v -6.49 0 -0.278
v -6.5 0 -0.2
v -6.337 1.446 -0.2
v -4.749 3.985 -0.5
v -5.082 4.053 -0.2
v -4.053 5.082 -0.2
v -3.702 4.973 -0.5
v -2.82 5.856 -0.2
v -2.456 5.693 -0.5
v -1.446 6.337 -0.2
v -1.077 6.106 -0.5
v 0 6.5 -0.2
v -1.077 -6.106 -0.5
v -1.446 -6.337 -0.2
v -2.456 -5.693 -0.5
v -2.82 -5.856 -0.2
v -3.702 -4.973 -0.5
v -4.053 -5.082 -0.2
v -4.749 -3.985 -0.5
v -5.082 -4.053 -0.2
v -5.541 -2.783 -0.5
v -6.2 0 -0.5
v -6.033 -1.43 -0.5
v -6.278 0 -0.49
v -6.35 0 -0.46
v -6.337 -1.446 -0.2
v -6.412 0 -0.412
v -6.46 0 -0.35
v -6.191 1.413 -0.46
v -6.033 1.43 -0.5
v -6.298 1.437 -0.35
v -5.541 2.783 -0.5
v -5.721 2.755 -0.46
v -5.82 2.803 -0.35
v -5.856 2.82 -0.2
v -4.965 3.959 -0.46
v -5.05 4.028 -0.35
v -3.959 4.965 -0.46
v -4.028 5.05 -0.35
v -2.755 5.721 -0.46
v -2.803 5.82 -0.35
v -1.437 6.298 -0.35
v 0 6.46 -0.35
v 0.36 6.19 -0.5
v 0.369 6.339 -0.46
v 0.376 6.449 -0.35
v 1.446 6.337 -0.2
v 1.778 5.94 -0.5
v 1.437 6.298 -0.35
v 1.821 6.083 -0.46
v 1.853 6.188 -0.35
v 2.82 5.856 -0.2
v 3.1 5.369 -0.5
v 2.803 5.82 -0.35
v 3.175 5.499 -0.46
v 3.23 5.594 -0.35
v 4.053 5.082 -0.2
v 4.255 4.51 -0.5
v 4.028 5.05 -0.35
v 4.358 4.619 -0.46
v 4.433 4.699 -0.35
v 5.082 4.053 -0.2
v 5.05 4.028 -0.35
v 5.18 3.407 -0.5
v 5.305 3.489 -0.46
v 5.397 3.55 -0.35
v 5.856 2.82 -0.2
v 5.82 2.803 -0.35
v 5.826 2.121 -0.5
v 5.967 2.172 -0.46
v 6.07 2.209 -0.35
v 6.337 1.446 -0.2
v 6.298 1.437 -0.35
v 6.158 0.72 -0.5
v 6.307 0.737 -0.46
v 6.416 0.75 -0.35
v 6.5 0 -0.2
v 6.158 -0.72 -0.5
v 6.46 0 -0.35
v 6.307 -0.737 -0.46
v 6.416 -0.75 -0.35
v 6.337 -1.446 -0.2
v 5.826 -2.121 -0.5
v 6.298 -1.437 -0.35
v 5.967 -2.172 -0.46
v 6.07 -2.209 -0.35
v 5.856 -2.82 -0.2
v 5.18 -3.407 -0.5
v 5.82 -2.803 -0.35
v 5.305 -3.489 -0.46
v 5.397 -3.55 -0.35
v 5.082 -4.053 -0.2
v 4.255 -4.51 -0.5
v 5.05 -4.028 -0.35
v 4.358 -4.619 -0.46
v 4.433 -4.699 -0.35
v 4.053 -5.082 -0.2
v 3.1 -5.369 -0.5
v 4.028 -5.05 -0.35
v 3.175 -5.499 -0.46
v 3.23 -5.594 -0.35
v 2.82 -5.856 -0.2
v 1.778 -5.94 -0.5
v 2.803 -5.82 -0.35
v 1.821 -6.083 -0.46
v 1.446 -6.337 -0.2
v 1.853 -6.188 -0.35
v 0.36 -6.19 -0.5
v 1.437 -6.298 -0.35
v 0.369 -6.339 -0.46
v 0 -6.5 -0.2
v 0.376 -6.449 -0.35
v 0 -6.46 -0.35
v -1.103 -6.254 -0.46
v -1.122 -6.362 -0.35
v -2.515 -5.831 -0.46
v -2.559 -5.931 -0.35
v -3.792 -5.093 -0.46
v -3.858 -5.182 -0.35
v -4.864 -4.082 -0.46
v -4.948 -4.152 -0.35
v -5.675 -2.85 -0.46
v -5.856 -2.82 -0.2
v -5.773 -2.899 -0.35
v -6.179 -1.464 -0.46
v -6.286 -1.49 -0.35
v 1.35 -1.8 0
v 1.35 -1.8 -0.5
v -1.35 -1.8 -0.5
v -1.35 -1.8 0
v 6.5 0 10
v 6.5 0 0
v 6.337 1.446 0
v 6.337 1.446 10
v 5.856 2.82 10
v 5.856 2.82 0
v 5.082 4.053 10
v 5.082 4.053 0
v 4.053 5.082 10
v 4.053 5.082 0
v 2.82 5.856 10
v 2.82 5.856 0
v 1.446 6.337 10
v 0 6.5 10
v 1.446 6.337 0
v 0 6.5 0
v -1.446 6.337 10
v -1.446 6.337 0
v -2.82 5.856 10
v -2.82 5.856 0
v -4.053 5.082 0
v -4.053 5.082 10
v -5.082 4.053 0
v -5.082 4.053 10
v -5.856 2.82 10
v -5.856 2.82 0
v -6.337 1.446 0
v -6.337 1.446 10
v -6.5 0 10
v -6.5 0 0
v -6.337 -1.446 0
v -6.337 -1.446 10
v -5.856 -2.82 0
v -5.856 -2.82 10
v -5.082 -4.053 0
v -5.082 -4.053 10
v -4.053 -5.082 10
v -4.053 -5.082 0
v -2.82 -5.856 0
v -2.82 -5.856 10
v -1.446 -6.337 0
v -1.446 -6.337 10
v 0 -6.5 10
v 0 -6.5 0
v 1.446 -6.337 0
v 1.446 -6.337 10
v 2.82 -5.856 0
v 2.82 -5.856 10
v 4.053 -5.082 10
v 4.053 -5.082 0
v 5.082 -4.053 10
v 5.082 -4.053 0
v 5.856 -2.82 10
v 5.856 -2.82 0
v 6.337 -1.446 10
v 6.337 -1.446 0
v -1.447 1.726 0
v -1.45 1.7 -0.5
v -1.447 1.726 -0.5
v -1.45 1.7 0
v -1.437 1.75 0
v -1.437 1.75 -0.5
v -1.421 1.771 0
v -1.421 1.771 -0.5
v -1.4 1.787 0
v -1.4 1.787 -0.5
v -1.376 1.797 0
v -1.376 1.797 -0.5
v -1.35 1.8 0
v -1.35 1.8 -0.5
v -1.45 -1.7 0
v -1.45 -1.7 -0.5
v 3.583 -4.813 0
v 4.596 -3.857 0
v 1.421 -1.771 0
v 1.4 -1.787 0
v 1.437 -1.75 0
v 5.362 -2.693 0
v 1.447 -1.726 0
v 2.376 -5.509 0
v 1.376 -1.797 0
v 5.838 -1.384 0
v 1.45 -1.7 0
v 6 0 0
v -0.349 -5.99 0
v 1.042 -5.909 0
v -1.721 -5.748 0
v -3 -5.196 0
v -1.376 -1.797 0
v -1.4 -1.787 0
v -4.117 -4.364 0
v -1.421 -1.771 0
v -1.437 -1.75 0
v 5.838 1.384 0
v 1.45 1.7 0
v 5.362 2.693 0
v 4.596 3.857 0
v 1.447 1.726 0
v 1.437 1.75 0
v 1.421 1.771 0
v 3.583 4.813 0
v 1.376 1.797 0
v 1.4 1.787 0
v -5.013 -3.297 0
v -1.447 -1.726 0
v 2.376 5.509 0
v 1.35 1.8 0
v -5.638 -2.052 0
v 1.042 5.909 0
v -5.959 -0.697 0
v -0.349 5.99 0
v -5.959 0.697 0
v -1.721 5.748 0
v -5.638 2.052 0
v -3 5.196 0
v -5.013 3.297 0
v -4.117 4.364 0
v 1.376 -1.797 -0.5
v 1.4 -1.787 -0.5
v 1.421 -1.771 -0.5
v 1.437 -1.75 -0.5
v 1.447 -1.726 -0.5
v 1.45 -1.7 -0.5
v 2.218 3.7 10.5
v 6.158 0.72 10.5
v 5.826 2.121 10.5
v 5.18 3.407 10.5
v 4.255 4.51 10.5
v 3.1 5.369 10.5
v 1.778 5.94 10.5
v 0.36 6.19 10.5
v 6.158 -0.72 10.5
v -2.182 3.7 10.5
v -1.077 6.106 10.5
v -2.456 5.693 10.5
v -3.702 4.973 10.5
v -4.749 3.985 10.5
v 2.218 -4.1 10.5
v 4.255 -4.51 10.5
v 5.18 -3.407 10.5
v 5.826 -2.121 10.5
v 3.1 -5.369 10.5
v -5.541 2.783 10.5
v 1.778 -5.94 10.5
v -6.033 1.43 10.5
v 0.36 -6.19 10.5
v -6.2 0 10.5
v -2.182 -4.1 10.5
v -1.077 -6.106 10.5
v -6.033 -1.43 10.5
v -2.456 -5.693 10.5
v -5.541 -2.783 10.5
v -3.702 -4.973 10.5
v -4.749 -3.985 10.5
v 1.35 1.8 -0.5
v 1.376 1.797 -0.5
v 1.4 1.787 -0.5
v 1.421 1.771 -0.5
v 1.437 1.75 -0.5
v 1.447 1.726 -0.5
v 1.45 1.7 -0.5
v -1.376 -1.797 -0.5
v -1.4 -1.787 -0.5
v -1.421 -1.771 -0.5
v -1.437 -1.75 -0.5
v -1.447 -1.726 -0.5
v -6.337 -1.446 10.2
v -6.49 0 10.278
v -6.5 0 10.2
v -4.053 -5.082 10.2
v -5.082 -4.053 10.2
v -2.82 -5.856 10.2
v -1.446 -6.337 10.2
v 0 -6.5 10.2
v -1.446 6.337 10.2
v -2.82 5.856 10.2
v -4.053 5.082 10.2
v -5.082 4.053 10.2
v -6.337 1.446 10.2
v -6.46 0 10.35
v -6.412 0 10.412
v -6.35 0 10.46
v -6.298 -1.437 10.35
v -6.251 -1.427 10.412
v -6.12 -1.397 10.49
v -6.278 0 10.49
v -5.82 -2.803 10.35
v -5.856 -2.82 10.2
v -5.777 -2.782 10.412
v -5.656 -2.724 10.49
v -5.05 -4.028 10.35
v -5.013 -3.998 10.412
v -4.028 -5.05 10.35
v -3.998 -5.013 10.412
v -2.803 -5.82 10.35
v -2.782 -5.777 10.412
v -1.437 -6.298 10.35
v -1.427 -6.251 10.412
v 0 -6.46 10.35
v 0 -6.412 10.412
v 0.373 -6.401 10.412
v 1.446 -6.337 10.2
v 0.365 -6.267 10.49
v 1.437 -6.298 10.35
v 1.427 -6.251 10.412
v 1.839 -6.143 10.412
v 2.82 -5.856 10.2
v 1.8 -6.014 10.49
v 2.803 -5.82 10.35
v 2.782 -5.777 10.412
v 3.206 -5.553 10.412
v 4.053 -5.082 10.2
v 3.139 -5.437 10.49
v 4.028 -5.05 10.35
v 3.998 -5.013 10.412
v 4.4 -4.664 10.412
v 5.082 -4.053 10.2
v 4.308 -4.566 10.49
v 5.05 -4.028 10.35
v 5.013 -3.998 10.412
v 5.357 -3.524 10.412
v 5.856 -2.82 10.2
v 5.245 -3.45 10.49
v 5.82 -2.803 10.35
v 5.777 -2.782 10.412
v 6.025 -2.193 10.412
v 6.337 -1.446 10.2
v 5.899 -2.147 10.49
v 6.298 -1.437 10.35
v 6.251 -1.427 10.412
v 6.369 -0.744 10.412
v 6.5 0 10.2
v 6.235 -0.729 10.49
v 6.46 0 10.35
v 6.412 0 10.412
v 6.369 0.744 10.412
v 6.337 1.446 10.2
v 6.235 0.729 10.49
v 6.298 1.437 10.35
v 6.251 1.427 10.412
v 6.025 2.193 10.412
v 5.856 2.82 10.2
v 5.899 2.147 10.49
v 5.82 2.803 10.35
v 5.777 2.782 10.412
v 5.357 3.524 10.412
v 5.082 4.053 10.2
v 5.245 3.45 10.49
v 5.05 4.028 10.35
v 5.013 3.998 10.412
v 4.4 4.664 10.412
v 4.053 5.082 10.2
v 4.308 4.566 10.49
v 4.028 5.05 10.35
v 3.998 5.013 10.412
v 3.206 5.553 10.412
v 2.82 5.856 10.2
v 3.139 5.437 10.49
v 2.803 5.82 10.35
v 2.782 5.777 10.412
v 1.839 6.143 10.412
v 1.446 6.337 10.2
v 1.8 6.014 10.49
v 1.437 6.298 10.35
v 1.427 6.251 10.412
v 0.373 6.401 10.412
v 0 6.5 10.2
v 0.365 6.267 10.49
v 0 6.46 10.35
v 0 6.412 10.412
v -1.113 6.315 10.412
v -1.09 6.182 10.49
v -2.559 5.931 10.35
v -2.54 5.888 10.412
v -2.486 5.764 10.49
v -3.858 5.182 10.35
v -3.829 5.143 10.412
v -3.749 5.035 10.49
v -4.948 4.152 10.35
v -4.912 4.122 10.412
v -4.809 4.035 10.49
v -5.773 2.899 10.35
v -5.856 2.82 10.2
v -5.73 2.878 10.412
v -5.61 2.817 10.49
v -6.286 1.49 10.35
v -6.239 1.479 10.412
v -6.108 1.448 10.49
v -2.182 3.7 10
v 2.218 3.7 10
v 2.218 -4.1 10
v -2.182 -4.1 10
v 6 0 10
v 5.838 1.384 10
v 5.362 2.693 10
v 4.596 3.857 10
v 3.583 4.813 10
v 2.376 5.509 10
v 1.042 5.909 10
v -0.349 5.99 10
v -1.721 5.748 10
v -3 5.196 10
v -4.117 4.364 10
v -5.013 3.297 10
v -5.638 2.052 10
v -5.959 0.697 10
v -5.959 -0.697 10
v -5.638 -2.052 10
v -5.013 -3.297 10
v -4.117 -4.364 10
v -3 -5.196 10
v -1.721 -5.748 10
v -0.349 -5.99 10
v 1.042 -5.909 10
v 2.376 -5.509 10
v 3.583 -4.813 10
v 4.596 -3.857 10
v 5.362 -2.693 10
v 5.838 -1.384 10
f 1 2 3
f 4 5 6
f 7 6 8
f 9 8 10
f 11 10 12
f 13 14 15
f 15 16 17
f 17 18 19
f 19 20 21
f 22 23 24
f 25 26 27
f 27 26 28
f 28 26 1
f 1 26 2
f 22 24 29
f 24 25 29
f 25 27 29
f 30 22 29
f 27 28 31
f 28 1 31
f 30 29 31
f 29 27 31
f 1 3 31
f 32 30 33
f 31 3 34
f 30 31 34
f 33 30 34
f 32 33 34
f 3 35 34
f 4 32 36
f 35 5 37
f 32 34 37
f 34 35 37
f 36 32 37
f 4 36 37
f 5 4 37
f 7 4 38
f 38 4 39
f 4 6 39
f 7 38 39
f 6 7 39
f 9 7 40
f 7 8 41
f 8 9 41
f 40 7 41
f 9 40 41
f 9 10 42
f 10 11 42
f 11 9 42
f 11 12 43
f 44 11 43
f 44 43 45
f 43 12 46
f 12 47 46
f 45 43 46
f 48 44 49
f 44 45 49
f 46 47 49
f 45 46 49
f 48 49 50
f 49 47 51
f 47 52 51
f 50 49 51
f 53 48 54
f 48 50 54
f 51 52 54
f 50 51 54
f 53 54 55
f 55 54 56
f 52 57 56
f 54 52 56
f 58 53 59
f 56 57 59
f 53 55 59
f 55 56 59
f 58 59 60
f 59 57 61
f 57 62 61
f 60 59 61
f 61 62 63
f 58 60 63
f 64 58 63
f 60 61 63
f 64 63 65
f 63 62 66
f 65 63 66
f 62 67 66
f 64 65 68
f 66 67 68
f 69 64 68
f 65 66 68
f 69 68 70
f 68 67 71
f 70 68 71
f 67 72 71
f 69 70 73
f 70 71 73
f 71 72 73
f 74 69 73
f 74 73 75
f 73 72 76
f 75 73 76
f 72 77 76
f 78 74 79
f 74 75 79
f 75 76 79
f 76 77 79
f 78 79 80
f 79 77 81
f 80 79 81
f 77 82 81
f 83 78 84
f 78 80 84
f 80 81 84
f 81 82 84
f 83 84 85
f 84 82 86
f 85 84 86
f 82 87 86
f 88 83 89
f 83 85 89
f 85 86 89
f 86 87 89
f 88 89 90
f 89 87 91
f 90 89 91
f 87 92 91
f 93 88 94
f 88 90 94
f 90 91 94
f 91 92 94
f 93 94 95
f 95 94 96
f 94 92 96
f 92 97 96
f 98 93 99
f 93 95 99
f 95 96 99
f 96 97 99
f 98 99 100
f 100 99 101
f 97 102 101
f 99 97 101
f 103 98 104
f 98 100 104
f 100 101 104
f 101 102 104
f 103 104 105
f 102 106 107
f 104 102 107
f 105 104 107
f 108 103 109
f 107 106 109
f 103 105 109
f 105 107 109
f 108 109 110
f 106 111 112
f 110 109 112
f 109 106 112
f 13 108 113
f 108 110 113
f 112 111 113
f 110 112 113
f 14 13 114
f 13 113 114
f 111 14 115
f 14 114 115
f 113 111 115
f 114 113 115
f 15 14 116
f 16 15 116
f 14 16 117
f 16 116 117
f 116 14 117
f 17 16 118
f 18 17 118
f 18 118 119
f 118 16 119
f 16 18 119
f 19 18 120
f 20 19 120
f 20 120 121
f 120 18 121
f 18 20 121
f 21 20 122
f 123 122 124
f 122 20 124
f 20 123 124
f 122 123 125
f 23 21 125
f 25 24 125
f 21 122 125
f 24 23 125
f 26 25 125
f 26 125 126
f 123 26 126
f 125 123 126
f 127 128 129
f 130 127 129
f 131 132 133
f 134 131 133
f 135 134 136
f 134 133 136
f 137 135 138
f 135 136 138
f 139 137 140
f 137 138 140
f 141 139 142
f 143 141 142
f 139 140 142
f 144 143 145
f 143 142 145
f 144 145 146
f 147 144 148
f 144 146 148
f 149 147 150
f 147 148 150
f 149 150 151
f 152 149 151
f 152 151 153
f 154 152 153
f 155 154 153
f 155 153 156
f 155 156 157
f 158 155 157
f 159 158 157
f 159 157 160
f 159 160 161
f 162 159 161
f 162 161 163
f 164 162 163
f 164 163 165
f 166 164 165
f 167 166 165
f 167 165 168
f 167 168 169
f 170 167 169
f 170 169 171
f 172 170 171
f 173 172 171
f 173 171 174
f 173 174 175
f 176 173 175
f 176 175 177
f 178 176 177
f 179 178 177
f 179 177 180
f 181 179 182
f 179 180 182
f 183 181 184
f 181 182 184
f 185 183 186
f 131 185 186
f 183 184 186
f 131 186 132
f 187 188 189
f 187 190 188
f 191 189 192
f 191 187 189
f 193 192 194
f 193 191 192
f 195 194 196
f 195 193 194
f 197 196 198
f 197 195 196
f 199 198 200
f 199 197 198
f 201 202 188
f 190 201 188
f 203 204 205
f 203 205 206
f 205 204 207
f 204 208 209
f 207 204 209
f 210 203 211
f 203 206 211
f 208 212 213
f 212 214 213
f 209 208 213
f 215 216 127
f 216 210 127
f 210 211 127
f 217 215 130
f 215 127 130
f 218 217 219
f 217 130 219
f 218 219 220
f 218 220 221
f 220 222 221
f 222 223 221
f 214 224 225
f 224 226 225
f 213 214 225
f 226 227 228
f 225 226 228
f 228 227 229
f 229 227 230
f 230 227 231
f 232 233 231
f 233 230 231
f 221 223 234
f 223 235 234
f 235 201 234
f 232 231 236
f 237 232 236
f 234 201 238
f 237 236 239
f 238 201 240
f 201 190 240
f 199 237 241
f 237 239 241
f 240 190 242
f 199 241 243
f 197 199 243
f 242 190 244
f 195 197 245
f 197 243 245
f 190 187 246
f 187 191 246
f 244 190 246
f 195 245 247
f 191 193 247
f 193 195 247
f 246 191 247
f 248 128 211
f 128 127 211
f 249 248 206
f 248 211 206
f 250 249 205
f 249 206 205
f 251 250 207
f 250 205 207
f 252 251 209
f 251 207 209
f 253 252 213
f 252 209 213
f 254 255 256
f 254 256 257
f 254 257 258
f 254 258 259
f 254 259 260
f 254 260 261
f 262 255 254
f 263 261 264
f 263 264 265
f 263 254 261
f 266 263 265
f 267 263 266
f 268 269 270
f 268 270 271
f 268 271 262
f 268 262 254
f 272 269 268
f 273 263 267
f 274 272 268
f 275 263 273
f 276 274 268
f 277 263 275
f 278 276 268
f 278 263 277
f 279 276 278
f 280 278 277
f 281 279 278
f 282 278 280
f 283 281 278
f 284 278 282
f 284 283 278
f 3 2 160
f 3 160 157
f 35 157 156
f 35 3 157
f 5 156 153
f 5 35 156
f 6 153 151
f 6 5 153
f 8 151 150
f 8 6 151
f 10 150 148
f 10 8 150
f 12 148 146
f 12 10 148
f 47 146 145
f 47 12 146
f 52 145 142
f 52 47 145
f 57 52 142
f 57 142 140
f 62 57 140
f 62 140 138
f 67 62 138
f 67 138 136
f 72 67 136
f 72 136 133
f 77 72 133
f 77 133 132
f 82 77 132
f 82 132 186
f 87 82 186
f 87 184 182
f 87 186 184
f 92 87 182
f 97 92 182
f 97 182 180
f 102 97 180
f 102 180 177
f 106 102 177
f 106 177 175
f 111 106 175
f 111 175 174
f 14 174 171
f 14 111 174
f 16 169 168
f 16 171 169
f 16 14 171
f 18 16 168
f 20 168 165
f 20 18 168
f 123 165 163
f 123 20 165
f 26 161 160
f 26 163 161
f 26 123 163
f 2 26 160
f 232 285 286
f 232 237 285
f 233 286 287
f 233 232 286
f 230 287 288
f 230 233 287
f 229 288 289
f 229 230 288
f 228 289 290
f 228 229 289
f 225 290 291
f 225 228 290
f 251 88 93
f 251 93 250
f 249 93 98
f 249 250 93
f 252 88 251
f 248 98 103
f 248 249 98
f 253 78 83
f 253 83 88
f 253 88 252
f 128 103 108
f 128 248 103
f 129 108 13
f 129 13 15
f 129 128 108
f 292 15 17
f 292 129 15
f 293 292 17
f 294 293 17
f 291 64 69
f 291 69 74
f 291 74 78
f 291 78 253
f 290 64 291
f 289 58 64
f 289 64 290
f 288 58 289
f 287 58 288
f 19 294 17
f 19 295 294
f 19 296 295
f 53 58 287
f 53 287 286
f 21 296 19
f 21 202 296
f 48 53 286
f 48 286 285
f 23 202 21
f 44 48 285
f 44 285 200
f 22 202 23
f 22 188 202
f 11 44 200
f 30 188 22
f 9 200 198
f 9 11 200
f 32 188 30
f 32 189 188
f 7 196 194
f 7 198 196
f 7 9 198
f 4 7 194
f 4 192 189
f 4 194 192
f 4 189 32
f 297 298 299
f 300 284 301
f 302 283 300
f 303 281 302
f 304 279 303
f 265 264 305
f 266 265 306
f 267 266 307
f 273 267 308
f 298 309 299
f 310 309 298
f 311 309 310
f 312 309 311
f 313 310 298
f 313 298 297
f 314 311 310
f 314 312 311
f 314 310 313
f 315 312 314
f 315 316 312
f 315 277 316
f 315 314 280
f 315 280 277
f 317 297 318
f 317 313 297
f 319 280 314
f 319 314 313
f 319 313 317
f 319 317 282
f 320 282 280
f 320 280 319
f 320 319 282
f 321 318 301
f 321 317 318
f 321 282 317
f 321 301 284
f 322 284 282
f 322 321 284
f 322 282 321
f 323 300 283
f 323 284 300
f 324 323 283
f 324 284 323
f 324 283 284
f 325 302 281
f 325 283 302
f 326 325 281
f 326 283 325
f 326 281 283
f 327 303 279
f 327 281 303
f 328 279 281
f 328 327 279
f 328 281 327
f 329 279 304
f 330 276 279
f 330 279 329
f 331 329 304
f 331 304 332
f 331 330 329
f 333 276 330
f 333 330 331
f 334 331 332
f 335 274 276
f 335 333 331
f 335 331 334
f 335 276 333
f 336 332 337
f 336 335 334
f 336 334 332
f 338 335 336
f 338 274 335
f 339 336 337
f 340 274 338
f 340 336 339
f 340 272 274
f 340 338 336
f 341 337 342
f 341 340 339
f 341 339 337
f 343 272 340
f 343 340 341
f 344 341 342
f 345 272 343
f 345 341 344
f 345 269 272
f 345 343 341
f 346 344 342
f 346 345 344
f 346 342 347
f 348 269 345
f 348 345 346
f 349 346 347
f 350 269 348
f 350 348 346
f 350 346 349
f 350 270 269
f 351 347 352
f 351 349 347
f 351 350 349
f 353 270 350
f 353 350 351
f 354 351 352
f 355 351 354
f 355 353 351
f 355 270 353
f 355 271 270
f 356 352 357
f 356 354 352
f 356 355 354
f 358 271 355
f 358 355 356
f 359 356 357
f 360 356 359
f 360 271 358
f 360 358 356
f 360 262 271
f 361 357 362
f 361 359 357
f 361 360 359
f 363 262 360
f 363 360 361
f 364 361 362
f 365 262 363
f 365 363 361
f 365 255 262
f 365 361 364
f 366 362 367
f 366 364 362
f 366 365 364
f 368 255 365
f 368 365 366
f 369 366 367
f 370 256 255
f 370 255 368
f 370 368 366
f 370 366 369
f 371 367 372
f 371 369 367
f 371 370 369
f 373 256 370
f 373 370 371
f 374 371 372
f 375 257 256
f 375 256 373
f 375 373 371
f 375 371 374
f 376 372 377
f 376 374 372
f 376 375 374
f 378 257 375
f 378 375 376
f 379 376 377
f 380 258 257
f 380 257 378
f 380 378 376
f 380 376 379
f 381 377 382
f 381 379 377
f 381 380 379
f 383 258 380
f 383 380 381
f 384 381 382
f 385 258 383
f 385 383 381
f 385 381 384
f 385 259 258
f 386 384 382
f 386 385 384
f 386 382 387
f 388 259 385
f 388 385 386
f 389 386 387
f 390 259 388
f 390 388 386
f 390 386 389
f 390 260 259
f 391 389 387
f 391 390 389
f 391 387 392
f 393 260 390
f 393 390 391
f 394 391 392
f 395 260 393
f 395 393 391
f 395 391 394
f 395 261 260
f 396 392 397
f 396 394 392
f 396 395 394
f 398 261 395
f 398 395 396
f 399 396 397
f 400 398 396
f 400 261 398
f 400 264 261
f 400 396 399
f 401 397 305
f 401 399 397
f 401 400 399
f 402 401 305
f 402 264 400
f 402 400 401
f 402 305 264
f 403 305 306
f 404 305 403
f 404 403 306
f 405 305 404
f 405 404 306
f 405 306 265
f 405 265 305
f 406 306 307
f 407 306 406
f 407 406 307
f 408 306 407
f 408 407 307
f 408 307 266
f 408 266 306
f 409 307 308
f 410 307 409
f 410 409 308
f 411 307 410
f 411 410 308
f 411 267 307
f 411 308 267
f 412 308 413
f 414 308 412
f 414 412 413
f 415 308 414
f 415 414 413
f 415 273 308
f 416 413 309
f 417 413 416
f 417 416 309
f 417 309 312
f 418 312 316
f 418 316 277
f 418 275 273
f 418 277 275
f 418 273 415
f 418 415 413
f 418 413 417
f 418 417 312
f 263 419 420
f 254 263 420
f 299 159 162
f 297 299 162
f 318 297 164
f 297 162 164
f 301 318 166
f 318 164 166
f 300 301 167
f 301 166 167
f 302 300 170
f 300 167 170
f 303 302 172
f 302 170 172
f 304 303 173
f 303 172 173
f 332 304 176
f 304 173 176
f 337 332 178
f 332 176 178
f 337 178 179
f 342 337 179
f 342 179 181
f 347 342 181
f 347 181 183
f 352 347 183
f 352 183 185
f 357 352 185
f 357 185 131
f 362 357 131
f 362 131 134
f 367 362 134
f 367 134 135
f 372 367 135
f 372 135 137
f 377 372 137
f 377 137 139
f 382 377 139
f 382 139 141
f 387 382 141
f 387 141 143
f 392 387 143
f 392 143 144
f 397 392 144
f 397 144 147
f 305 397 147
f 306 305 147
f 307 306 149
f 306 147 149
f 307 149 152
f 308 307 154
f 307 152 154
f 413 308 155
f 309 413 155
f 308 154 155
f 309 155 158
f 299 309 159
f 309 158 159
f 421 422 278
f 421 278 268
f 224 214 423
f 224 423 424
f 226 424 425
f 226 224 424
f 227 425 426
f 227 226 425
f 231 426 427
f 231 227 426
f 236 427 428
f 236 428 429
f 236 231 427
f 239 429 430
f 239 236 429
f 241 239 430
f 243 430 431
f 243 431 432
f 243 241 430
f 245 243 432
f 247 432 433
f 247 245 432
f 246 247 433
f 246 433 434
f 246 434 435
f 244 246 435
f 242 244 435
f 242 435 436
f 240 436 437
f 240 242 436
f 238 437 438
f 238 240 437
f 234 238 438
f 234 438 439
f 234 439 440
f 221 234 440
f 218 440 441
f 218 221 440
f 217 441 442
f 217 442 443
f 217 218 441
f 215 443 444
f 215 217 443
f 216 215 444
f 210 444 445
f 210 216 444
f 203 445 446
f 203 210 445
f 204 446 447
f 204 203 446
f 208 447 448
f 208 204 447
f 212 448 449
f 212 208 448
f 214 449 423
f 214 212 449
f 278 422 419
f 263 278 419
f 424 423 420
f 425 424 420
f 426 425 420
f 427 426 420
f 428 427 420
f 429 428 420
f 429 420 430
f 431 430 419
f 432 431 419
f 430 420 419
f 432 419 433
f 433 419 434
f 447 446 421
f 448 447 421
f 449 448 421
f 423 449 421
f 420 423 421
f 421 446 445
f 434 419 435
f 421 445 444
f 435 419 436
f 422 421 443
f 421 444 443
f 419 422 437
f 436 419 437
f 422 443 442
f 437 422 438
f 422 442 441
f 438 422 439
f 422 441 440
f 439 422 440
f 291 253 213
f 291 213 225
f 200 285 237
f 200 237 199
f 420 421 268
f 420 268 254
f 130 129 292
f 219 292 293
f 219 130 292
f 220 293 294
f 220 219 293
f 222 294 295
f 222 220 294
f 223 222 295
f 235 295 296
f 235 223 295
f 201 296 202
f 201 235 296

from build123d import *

# Parameters (mm, degrees)
SKETCH1_R           = 6.5
SKETCH1_R_2         = 6
BOSS_EXTRUDE1_DEPTH = 10
BOSS_EXTRUDE2_START = 0.5
SKETCH2_R           = 6.5
BOSS_EXTRUDE2_DEPTH = 0.5
SKETCH3_R           = 6.5
SKETCH3_W           = 4.4
SKETCH3_H           = 7.8
BOSS_EXTRUDE3_DEPTH = 0.5
SKETCH4_W           = 2.9
SKETCH4_H           = 3.6
CUT_EXTRUDE1_DEPTH  = 1
FILLET1_R           = 0.1
FILLET2_R           = 0.3


with BuildPart() as part:
    # Sketch1 → Boss-Extrude1 (new body)
    with BuildSketch(Plane.XY):
        Circle(SKETCH1_R)
        Circle(SKETCH1_R_2, mode=Mode.SUBTRACT)
    extrude(amount=BOSS_EXTRUDE1_DEPTH)

    # Sketch2 → Boss-Extrude2 (add)
    with BuildSketch(Plane(origin=(0, 0, 0), x_dir=(-1, 0, 0), z_dir=(0, 0, -1)).offset(BOSS_EXTRUDE2_START)):
        Circle(SKETCH2_R)
    extrude(amount=-BOSS_EXTRUDE2_DEPTH)

    # Sketch3 → Boss-Extrude3 (add)
    with BuildSketch(Plane.XY.offset(10)):
        with Locations(Location((0, 0, 0), (0, 0, 180))):
            Circle(SKETCH3_R)
        with Locations((0.018144407, -0.2)):
            Rectangle(SKETCH3_W, SKETCH3_H, mode=Mode.SUBTRACT)
    extrude(amount=BOSS_EXTRUDE3_DEPTH)

    # Sketch4 → Cut-Extrude1 (cut)
    with BuildSketch(Plane(origin=(0, 0, -0.5), x_dir=(-1, 0, 0), z_dir=(0, 0, -1))):
        Rectangle(SKETCH4_W, SKETCH4_H)
    extrude(amount=-CUT_EXTRUDE1_DEPTH, mode=Mode.SUBTRACT)

    # Fillet1
    fillet1_edges = [part.edges().sort_by_distance(p)[0] for p in [
        (-1.45, 1.8, -0.25),
        (-1.45, -1.8, -0.25),
        (1.45, -1.8, -0.25),
        (1.45, 1.8, -0.25),
    ]]
    fillet(fillet1_edges, radius=FILLET1_R)

    # Fillet2
    fillet2_edges = [part.edges().sort_by_distance(p)[0] for p in [
        (6.5, 0, -0.5),
        (6.5, 0, 10.5),
    ]]
    fillet(fillet2_edges, radius=FILLET2_R)


solid = part.part
